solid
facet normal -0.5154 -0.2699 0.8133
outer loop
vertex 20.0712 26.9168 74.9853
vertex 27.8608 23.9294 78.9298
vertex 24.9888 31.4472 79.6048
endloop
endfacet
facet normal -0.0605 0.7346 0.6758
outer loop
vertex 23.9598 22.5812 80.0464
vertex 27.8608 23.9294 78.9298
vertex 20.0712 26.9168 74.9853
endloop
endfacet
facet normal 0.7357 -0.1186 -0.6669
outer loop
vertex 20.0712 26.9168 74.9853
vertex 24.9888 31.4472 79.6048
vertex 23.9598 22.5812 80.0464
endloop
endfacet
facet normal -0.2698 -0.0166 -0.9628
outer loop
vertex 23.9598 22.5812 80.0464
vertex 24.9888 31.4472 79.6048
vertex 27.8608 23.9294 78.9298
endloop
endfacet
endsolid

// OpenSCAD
// Auto-generated auxetic polyhedron
points = [
    [24.988792, 31.447166, 79.604793],
    [27.860793, 23.929442, 78.929831],
    [20.071239, 26.916823, 74.985344],
    [23.959783, 22.581157, 80.046420],
];

faces = [
    [0, 1, 2],
    [2, 1, 3],
    [3, 0, 2],
    [1, 0, 3],
];

polyhedron(points = points, faces = faces);
